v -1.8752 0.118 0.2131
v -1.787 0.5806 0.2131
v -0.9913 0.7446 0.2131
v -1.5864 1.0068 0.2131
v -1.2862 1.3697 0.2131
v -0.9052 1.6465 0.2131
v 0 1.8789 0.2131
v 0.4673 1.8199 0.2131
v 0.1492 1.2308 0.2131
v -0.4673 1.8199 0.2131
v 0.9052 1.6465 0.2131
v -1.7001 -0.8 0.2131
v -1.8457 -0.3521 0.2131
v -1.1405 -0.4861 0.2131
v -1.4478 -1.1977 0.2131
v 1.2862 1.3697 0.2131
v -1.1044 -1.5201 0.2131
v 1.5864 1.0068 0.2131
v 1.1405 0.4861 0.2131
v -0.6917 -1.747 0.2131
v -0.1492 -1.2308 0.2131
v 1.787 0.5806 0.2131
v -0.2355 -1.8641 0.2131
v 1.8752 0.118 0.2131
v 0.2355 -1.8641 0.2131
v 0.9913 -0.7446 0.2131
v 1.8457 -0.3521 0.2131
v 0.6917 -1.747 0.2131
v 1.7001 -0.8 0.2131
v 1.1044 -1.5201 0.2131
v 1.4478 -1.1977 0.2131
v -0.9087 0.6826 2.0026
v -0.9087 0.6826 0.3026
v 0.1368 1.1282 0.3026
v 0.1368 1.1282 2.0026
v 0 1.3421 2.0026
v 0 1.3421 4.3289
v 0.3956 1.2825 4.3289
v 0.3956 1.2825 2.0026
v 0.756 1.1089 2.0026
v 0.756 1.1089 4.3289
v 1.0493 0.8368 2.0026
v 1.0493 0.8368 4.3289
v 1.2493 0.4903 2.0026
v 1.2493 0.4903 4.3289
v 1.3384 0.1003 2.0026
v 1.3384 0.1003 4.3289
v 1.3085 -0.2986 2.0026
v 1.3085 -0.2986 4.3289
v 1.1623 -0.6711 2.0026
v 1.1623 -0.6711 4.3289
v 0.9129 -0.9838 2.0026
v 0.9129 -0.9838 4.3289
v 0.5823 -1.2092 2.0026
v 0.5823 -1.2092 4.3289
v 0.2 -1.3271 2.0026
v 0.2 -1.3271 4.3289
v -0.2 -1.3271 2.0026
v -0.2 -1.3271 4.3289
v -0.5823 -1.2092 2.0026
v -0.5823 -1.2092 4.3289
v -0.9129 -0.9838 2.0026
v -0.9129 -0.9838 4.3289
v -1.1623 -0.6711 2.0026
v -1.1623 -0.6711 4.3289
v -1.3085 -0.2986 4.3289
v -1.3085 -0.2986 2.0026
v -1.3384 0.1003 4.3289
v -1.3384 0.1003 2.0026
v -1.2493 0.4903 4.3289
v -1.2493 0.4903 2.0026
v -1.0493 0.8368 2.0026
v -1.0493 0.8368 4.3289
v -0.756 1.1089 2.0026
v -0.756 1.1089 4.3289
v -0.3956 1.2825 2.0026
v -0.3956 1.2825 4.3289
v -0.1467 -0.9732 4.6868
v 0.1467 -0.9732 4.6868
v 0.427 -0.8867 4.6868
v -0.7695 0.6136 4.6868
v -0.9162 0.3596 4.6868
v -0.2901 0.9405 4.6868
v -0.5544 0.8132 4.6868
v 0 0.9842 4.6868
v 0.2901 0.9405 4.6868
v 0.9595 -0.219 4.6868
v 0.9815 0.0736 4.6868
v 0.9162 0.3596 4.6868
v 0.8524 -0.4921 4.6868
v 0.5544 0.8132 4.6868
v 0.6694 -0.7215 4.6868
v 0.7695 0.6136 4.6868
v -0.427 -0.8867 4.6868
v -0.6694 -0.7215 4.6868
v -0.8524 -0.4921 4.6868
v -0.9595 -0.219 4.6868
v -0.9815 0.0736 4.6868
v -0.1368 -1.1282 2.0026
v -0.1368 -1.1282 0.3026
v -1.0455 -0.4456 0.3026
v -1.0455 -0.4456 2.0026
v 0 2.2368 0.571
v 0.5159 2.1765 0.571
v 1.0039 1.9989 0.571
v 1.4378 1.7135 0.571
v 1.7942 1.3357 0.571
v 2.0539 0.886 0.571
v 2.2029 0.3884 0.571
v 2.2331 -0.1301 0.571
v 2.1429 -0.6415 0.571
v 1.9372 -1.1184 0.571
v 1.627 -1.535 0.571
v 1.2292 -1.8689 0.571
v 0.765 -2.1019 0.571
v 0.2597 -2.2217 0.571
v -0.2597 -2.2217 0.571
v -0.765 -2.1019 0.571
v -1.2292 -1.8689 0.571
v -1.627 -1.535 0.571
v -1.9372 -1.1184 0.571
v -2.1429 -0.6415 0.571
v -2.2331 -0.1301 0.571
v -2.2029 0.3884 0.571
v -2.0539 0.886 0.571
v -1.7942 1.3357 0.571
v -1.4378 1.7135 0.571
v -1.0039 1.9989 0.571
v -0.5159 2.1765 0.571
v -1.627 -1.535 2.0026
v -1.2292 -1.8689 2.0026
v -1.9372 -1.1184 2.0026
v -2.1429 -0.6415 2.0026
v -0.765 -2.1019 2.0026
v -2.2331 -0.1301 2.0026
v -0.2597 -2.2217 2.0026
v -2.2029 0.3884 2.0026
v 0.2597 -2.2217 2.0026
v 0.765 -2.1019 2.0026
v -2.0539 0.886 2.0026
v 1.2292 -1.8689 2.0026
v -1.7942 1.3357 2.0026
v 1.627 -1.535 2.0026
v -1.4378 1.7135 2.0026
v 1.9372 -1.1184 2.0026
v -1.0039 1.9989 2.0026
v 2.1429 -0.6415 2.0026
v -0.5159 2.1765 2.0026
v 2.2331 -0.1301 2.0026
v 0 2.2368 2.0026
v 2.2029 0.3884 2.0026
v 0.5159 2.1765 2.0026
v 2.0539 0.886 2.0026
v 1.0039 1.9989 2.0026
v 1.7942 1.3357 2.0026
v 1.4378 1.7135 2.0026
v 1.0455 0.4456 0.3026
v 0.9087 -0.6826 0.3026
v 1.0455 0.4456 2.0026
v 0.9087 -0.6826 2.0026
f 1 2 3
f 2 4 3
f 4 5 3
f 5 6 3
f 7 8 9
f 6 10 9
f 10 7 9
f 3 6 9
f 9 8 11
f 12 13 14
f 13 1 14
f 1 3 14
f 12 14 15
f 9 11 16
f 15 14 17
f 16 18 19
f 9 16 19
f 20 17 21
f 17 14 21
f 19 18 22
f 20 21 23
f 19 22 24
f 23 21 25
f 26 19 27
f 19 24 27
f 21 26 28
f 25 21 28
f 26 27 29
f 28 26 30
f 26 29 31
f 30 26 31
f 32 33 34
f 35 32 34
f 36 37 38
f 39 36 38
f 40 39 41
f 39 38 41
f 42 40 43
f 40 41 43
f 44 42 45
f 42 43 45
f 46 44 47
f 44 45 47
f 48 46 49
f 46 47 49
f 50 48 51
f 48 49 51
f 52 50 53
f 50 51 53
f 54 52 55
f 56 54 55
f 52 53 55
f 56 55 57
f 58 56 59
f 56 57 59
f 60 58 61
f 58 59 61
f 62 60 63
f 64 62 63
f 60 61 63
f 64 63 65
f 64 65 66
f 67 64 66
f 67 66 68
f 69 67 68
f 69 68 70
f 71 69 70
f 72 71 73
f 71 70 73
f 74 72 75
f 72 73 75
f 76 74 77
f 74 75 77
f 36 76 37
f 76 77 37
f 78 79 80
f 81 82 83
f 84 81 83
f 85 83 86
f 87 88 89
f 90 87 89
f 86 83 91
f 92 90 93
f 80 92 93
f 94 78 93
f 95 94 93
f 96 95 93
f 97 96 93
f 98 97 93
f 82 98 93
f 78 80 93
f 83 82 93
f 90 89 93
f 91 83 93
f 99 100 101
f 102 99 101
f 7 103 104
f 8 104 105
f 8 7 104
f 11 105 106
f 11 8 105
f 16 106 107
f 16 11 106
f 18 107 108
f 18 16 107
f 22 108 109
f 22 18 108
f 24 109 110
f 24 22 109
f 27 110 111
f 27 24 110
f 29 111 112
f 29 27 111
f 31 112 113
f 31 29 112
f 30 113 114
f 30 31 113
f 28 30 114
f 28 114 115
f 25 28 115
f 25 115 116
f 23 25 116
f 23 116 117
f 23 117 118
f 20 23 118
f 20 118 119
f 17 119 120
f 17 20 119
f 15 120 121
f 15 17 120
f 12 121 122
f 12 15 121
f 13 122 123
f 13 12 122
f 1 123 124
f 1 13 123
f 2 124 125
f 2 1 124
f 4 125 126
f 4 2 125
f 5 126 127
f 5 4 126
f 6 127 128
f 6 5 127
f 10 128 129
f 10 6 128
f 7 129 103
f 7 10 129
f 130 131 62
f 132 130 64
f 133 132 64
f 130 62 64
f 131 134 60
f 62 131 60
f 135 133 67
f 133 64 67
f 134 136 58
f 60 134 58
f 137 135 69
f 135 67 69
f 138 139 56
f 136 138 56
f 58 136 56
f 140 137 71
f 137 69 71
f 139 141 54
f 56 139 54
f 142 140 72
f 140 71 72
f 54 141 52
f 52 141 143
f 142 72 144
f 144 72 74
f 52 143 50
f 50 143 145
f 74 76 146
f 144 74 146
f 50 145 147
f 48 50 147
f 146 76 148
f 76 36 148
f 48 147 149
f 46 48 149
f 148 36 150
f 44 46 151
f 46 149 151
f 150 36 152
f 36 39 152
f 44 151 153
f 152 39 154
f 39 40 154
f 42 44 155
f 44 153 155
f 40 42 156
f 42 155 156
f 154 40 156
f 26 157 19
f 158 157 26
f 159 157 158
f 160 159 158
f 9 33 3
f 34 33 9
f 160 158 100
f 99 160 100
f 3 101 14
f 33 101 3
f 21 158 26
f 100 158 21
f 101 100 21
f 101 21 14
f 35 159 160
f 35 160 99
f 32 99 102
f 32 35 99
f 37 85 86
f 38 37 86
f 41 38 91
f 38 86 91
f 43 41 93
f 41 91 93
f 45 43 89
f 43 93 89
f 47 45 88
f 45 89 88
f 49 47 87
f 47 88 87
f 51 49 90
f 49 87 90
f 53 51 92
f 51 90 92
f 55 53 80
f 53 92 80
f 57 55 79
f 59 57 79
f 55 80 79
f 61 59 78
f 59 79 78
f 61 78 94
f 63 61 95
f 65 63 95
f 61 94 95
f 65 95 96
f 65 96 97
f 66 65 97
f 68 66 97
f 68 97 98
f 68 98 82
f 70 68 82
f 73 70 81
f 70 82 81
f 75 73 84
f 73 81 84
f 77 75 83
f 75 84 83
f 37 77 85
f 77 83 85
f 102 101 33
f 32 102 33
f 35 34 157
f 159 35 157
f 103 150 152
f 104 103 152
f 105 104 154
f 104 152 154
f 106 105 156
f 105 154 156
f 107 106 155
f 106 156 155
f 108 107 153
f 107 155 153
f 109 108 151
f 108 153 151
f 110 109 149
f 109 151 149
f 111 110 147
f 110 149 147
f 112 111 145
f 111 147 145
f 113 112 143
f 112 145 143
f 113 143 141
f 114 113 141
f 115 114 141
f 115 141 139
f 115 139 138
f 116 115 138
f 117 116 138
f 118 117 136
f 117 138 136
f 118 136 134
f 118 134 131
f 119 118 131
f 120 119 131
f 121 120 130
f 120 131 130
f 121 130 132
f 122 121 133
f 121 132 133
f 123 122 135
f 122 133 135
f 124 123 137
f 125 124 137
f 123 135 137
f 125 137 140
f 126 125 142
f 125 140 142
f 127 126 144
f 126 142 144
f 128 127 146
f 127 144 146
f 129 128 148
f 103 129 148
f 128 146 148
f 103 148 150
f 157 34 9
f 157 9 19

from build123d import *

# Parameters (mm, degrees)
CUT_EXTRUDE1_DEPTH = 2
CHAMFER1_SIZE      = 0.4
CHAMFER2_SIZE      = 0.1
SCALE_1_SCALE      = 0.894736842


with BuildPart() as part:
    # Sketch2 → Revolve1 (revolve)
    with BuildSketch(Plane(origin=(0, 0, 0), x_dir=(0, 0, -1), z_dir=(1, 0, 0))):
        Polygon((0, 2.5), (-2, 2.5), (-2, 1.5), (-5, 1.5), (-5, 0), (0, 0), align=None)
    revolve(axis=Axis((0, 0, 5), (0, 0, -1)))

    # Sketch3 → Cut-Extrude1 (cut)
    with BuildSketch(Plane(origin=(0, 0, 0), x_dir=(-1, 0, 0), z_dir=(0, 0, -1))):
        Polygon((1.168445951, -0.498063644), (1.015558744, 0.762872054), (-0.152887207, 1.260935698), (-1.168445951, 0.498063644), (-1.015558744, -0.762872054), (0.152887207, -1.260935698), align=None)
    extrude(amount=-CUT_EXTRUDE1_DEPTH, mode=Mode.SUBTRACT)

    # Chamfer1
    chamfer1_edges = [part.edges().sort_by_distance(p)[0] for p in [
        (0, -1.5, 5),
        (0, -2.5, 0),
    ]]
    chamfer(chamfer1_edges, length=CHAMFER1_SIZE)

    # Chamfer2
    chamfer2_edges = [part.edges().sort_by_distance(p)[0] for p in [
        (-0.660666579, -0.879499671, 0),
        (-1.092002347, 0.132404205, 0),
        (-0.431335769, 1.011903876, 0),
        (0.660666579, 0.879499671, 0),
        (1.092002347, -0.132404205, 0),
        (0.431335769, -1.011903876, 0),
    ]]
    chamfer(chamfer2_edges, length=CHAMFER2_SIZE)


with BuildPart() as part_1:
    # ｽｹｰﾙ1: scaled about (0, 0, 2.024919763)
    add(part.part.scale(SCALE_1_SCALE).moved(Location((0, 0, 0.213149449))))


solid = part_1.part
